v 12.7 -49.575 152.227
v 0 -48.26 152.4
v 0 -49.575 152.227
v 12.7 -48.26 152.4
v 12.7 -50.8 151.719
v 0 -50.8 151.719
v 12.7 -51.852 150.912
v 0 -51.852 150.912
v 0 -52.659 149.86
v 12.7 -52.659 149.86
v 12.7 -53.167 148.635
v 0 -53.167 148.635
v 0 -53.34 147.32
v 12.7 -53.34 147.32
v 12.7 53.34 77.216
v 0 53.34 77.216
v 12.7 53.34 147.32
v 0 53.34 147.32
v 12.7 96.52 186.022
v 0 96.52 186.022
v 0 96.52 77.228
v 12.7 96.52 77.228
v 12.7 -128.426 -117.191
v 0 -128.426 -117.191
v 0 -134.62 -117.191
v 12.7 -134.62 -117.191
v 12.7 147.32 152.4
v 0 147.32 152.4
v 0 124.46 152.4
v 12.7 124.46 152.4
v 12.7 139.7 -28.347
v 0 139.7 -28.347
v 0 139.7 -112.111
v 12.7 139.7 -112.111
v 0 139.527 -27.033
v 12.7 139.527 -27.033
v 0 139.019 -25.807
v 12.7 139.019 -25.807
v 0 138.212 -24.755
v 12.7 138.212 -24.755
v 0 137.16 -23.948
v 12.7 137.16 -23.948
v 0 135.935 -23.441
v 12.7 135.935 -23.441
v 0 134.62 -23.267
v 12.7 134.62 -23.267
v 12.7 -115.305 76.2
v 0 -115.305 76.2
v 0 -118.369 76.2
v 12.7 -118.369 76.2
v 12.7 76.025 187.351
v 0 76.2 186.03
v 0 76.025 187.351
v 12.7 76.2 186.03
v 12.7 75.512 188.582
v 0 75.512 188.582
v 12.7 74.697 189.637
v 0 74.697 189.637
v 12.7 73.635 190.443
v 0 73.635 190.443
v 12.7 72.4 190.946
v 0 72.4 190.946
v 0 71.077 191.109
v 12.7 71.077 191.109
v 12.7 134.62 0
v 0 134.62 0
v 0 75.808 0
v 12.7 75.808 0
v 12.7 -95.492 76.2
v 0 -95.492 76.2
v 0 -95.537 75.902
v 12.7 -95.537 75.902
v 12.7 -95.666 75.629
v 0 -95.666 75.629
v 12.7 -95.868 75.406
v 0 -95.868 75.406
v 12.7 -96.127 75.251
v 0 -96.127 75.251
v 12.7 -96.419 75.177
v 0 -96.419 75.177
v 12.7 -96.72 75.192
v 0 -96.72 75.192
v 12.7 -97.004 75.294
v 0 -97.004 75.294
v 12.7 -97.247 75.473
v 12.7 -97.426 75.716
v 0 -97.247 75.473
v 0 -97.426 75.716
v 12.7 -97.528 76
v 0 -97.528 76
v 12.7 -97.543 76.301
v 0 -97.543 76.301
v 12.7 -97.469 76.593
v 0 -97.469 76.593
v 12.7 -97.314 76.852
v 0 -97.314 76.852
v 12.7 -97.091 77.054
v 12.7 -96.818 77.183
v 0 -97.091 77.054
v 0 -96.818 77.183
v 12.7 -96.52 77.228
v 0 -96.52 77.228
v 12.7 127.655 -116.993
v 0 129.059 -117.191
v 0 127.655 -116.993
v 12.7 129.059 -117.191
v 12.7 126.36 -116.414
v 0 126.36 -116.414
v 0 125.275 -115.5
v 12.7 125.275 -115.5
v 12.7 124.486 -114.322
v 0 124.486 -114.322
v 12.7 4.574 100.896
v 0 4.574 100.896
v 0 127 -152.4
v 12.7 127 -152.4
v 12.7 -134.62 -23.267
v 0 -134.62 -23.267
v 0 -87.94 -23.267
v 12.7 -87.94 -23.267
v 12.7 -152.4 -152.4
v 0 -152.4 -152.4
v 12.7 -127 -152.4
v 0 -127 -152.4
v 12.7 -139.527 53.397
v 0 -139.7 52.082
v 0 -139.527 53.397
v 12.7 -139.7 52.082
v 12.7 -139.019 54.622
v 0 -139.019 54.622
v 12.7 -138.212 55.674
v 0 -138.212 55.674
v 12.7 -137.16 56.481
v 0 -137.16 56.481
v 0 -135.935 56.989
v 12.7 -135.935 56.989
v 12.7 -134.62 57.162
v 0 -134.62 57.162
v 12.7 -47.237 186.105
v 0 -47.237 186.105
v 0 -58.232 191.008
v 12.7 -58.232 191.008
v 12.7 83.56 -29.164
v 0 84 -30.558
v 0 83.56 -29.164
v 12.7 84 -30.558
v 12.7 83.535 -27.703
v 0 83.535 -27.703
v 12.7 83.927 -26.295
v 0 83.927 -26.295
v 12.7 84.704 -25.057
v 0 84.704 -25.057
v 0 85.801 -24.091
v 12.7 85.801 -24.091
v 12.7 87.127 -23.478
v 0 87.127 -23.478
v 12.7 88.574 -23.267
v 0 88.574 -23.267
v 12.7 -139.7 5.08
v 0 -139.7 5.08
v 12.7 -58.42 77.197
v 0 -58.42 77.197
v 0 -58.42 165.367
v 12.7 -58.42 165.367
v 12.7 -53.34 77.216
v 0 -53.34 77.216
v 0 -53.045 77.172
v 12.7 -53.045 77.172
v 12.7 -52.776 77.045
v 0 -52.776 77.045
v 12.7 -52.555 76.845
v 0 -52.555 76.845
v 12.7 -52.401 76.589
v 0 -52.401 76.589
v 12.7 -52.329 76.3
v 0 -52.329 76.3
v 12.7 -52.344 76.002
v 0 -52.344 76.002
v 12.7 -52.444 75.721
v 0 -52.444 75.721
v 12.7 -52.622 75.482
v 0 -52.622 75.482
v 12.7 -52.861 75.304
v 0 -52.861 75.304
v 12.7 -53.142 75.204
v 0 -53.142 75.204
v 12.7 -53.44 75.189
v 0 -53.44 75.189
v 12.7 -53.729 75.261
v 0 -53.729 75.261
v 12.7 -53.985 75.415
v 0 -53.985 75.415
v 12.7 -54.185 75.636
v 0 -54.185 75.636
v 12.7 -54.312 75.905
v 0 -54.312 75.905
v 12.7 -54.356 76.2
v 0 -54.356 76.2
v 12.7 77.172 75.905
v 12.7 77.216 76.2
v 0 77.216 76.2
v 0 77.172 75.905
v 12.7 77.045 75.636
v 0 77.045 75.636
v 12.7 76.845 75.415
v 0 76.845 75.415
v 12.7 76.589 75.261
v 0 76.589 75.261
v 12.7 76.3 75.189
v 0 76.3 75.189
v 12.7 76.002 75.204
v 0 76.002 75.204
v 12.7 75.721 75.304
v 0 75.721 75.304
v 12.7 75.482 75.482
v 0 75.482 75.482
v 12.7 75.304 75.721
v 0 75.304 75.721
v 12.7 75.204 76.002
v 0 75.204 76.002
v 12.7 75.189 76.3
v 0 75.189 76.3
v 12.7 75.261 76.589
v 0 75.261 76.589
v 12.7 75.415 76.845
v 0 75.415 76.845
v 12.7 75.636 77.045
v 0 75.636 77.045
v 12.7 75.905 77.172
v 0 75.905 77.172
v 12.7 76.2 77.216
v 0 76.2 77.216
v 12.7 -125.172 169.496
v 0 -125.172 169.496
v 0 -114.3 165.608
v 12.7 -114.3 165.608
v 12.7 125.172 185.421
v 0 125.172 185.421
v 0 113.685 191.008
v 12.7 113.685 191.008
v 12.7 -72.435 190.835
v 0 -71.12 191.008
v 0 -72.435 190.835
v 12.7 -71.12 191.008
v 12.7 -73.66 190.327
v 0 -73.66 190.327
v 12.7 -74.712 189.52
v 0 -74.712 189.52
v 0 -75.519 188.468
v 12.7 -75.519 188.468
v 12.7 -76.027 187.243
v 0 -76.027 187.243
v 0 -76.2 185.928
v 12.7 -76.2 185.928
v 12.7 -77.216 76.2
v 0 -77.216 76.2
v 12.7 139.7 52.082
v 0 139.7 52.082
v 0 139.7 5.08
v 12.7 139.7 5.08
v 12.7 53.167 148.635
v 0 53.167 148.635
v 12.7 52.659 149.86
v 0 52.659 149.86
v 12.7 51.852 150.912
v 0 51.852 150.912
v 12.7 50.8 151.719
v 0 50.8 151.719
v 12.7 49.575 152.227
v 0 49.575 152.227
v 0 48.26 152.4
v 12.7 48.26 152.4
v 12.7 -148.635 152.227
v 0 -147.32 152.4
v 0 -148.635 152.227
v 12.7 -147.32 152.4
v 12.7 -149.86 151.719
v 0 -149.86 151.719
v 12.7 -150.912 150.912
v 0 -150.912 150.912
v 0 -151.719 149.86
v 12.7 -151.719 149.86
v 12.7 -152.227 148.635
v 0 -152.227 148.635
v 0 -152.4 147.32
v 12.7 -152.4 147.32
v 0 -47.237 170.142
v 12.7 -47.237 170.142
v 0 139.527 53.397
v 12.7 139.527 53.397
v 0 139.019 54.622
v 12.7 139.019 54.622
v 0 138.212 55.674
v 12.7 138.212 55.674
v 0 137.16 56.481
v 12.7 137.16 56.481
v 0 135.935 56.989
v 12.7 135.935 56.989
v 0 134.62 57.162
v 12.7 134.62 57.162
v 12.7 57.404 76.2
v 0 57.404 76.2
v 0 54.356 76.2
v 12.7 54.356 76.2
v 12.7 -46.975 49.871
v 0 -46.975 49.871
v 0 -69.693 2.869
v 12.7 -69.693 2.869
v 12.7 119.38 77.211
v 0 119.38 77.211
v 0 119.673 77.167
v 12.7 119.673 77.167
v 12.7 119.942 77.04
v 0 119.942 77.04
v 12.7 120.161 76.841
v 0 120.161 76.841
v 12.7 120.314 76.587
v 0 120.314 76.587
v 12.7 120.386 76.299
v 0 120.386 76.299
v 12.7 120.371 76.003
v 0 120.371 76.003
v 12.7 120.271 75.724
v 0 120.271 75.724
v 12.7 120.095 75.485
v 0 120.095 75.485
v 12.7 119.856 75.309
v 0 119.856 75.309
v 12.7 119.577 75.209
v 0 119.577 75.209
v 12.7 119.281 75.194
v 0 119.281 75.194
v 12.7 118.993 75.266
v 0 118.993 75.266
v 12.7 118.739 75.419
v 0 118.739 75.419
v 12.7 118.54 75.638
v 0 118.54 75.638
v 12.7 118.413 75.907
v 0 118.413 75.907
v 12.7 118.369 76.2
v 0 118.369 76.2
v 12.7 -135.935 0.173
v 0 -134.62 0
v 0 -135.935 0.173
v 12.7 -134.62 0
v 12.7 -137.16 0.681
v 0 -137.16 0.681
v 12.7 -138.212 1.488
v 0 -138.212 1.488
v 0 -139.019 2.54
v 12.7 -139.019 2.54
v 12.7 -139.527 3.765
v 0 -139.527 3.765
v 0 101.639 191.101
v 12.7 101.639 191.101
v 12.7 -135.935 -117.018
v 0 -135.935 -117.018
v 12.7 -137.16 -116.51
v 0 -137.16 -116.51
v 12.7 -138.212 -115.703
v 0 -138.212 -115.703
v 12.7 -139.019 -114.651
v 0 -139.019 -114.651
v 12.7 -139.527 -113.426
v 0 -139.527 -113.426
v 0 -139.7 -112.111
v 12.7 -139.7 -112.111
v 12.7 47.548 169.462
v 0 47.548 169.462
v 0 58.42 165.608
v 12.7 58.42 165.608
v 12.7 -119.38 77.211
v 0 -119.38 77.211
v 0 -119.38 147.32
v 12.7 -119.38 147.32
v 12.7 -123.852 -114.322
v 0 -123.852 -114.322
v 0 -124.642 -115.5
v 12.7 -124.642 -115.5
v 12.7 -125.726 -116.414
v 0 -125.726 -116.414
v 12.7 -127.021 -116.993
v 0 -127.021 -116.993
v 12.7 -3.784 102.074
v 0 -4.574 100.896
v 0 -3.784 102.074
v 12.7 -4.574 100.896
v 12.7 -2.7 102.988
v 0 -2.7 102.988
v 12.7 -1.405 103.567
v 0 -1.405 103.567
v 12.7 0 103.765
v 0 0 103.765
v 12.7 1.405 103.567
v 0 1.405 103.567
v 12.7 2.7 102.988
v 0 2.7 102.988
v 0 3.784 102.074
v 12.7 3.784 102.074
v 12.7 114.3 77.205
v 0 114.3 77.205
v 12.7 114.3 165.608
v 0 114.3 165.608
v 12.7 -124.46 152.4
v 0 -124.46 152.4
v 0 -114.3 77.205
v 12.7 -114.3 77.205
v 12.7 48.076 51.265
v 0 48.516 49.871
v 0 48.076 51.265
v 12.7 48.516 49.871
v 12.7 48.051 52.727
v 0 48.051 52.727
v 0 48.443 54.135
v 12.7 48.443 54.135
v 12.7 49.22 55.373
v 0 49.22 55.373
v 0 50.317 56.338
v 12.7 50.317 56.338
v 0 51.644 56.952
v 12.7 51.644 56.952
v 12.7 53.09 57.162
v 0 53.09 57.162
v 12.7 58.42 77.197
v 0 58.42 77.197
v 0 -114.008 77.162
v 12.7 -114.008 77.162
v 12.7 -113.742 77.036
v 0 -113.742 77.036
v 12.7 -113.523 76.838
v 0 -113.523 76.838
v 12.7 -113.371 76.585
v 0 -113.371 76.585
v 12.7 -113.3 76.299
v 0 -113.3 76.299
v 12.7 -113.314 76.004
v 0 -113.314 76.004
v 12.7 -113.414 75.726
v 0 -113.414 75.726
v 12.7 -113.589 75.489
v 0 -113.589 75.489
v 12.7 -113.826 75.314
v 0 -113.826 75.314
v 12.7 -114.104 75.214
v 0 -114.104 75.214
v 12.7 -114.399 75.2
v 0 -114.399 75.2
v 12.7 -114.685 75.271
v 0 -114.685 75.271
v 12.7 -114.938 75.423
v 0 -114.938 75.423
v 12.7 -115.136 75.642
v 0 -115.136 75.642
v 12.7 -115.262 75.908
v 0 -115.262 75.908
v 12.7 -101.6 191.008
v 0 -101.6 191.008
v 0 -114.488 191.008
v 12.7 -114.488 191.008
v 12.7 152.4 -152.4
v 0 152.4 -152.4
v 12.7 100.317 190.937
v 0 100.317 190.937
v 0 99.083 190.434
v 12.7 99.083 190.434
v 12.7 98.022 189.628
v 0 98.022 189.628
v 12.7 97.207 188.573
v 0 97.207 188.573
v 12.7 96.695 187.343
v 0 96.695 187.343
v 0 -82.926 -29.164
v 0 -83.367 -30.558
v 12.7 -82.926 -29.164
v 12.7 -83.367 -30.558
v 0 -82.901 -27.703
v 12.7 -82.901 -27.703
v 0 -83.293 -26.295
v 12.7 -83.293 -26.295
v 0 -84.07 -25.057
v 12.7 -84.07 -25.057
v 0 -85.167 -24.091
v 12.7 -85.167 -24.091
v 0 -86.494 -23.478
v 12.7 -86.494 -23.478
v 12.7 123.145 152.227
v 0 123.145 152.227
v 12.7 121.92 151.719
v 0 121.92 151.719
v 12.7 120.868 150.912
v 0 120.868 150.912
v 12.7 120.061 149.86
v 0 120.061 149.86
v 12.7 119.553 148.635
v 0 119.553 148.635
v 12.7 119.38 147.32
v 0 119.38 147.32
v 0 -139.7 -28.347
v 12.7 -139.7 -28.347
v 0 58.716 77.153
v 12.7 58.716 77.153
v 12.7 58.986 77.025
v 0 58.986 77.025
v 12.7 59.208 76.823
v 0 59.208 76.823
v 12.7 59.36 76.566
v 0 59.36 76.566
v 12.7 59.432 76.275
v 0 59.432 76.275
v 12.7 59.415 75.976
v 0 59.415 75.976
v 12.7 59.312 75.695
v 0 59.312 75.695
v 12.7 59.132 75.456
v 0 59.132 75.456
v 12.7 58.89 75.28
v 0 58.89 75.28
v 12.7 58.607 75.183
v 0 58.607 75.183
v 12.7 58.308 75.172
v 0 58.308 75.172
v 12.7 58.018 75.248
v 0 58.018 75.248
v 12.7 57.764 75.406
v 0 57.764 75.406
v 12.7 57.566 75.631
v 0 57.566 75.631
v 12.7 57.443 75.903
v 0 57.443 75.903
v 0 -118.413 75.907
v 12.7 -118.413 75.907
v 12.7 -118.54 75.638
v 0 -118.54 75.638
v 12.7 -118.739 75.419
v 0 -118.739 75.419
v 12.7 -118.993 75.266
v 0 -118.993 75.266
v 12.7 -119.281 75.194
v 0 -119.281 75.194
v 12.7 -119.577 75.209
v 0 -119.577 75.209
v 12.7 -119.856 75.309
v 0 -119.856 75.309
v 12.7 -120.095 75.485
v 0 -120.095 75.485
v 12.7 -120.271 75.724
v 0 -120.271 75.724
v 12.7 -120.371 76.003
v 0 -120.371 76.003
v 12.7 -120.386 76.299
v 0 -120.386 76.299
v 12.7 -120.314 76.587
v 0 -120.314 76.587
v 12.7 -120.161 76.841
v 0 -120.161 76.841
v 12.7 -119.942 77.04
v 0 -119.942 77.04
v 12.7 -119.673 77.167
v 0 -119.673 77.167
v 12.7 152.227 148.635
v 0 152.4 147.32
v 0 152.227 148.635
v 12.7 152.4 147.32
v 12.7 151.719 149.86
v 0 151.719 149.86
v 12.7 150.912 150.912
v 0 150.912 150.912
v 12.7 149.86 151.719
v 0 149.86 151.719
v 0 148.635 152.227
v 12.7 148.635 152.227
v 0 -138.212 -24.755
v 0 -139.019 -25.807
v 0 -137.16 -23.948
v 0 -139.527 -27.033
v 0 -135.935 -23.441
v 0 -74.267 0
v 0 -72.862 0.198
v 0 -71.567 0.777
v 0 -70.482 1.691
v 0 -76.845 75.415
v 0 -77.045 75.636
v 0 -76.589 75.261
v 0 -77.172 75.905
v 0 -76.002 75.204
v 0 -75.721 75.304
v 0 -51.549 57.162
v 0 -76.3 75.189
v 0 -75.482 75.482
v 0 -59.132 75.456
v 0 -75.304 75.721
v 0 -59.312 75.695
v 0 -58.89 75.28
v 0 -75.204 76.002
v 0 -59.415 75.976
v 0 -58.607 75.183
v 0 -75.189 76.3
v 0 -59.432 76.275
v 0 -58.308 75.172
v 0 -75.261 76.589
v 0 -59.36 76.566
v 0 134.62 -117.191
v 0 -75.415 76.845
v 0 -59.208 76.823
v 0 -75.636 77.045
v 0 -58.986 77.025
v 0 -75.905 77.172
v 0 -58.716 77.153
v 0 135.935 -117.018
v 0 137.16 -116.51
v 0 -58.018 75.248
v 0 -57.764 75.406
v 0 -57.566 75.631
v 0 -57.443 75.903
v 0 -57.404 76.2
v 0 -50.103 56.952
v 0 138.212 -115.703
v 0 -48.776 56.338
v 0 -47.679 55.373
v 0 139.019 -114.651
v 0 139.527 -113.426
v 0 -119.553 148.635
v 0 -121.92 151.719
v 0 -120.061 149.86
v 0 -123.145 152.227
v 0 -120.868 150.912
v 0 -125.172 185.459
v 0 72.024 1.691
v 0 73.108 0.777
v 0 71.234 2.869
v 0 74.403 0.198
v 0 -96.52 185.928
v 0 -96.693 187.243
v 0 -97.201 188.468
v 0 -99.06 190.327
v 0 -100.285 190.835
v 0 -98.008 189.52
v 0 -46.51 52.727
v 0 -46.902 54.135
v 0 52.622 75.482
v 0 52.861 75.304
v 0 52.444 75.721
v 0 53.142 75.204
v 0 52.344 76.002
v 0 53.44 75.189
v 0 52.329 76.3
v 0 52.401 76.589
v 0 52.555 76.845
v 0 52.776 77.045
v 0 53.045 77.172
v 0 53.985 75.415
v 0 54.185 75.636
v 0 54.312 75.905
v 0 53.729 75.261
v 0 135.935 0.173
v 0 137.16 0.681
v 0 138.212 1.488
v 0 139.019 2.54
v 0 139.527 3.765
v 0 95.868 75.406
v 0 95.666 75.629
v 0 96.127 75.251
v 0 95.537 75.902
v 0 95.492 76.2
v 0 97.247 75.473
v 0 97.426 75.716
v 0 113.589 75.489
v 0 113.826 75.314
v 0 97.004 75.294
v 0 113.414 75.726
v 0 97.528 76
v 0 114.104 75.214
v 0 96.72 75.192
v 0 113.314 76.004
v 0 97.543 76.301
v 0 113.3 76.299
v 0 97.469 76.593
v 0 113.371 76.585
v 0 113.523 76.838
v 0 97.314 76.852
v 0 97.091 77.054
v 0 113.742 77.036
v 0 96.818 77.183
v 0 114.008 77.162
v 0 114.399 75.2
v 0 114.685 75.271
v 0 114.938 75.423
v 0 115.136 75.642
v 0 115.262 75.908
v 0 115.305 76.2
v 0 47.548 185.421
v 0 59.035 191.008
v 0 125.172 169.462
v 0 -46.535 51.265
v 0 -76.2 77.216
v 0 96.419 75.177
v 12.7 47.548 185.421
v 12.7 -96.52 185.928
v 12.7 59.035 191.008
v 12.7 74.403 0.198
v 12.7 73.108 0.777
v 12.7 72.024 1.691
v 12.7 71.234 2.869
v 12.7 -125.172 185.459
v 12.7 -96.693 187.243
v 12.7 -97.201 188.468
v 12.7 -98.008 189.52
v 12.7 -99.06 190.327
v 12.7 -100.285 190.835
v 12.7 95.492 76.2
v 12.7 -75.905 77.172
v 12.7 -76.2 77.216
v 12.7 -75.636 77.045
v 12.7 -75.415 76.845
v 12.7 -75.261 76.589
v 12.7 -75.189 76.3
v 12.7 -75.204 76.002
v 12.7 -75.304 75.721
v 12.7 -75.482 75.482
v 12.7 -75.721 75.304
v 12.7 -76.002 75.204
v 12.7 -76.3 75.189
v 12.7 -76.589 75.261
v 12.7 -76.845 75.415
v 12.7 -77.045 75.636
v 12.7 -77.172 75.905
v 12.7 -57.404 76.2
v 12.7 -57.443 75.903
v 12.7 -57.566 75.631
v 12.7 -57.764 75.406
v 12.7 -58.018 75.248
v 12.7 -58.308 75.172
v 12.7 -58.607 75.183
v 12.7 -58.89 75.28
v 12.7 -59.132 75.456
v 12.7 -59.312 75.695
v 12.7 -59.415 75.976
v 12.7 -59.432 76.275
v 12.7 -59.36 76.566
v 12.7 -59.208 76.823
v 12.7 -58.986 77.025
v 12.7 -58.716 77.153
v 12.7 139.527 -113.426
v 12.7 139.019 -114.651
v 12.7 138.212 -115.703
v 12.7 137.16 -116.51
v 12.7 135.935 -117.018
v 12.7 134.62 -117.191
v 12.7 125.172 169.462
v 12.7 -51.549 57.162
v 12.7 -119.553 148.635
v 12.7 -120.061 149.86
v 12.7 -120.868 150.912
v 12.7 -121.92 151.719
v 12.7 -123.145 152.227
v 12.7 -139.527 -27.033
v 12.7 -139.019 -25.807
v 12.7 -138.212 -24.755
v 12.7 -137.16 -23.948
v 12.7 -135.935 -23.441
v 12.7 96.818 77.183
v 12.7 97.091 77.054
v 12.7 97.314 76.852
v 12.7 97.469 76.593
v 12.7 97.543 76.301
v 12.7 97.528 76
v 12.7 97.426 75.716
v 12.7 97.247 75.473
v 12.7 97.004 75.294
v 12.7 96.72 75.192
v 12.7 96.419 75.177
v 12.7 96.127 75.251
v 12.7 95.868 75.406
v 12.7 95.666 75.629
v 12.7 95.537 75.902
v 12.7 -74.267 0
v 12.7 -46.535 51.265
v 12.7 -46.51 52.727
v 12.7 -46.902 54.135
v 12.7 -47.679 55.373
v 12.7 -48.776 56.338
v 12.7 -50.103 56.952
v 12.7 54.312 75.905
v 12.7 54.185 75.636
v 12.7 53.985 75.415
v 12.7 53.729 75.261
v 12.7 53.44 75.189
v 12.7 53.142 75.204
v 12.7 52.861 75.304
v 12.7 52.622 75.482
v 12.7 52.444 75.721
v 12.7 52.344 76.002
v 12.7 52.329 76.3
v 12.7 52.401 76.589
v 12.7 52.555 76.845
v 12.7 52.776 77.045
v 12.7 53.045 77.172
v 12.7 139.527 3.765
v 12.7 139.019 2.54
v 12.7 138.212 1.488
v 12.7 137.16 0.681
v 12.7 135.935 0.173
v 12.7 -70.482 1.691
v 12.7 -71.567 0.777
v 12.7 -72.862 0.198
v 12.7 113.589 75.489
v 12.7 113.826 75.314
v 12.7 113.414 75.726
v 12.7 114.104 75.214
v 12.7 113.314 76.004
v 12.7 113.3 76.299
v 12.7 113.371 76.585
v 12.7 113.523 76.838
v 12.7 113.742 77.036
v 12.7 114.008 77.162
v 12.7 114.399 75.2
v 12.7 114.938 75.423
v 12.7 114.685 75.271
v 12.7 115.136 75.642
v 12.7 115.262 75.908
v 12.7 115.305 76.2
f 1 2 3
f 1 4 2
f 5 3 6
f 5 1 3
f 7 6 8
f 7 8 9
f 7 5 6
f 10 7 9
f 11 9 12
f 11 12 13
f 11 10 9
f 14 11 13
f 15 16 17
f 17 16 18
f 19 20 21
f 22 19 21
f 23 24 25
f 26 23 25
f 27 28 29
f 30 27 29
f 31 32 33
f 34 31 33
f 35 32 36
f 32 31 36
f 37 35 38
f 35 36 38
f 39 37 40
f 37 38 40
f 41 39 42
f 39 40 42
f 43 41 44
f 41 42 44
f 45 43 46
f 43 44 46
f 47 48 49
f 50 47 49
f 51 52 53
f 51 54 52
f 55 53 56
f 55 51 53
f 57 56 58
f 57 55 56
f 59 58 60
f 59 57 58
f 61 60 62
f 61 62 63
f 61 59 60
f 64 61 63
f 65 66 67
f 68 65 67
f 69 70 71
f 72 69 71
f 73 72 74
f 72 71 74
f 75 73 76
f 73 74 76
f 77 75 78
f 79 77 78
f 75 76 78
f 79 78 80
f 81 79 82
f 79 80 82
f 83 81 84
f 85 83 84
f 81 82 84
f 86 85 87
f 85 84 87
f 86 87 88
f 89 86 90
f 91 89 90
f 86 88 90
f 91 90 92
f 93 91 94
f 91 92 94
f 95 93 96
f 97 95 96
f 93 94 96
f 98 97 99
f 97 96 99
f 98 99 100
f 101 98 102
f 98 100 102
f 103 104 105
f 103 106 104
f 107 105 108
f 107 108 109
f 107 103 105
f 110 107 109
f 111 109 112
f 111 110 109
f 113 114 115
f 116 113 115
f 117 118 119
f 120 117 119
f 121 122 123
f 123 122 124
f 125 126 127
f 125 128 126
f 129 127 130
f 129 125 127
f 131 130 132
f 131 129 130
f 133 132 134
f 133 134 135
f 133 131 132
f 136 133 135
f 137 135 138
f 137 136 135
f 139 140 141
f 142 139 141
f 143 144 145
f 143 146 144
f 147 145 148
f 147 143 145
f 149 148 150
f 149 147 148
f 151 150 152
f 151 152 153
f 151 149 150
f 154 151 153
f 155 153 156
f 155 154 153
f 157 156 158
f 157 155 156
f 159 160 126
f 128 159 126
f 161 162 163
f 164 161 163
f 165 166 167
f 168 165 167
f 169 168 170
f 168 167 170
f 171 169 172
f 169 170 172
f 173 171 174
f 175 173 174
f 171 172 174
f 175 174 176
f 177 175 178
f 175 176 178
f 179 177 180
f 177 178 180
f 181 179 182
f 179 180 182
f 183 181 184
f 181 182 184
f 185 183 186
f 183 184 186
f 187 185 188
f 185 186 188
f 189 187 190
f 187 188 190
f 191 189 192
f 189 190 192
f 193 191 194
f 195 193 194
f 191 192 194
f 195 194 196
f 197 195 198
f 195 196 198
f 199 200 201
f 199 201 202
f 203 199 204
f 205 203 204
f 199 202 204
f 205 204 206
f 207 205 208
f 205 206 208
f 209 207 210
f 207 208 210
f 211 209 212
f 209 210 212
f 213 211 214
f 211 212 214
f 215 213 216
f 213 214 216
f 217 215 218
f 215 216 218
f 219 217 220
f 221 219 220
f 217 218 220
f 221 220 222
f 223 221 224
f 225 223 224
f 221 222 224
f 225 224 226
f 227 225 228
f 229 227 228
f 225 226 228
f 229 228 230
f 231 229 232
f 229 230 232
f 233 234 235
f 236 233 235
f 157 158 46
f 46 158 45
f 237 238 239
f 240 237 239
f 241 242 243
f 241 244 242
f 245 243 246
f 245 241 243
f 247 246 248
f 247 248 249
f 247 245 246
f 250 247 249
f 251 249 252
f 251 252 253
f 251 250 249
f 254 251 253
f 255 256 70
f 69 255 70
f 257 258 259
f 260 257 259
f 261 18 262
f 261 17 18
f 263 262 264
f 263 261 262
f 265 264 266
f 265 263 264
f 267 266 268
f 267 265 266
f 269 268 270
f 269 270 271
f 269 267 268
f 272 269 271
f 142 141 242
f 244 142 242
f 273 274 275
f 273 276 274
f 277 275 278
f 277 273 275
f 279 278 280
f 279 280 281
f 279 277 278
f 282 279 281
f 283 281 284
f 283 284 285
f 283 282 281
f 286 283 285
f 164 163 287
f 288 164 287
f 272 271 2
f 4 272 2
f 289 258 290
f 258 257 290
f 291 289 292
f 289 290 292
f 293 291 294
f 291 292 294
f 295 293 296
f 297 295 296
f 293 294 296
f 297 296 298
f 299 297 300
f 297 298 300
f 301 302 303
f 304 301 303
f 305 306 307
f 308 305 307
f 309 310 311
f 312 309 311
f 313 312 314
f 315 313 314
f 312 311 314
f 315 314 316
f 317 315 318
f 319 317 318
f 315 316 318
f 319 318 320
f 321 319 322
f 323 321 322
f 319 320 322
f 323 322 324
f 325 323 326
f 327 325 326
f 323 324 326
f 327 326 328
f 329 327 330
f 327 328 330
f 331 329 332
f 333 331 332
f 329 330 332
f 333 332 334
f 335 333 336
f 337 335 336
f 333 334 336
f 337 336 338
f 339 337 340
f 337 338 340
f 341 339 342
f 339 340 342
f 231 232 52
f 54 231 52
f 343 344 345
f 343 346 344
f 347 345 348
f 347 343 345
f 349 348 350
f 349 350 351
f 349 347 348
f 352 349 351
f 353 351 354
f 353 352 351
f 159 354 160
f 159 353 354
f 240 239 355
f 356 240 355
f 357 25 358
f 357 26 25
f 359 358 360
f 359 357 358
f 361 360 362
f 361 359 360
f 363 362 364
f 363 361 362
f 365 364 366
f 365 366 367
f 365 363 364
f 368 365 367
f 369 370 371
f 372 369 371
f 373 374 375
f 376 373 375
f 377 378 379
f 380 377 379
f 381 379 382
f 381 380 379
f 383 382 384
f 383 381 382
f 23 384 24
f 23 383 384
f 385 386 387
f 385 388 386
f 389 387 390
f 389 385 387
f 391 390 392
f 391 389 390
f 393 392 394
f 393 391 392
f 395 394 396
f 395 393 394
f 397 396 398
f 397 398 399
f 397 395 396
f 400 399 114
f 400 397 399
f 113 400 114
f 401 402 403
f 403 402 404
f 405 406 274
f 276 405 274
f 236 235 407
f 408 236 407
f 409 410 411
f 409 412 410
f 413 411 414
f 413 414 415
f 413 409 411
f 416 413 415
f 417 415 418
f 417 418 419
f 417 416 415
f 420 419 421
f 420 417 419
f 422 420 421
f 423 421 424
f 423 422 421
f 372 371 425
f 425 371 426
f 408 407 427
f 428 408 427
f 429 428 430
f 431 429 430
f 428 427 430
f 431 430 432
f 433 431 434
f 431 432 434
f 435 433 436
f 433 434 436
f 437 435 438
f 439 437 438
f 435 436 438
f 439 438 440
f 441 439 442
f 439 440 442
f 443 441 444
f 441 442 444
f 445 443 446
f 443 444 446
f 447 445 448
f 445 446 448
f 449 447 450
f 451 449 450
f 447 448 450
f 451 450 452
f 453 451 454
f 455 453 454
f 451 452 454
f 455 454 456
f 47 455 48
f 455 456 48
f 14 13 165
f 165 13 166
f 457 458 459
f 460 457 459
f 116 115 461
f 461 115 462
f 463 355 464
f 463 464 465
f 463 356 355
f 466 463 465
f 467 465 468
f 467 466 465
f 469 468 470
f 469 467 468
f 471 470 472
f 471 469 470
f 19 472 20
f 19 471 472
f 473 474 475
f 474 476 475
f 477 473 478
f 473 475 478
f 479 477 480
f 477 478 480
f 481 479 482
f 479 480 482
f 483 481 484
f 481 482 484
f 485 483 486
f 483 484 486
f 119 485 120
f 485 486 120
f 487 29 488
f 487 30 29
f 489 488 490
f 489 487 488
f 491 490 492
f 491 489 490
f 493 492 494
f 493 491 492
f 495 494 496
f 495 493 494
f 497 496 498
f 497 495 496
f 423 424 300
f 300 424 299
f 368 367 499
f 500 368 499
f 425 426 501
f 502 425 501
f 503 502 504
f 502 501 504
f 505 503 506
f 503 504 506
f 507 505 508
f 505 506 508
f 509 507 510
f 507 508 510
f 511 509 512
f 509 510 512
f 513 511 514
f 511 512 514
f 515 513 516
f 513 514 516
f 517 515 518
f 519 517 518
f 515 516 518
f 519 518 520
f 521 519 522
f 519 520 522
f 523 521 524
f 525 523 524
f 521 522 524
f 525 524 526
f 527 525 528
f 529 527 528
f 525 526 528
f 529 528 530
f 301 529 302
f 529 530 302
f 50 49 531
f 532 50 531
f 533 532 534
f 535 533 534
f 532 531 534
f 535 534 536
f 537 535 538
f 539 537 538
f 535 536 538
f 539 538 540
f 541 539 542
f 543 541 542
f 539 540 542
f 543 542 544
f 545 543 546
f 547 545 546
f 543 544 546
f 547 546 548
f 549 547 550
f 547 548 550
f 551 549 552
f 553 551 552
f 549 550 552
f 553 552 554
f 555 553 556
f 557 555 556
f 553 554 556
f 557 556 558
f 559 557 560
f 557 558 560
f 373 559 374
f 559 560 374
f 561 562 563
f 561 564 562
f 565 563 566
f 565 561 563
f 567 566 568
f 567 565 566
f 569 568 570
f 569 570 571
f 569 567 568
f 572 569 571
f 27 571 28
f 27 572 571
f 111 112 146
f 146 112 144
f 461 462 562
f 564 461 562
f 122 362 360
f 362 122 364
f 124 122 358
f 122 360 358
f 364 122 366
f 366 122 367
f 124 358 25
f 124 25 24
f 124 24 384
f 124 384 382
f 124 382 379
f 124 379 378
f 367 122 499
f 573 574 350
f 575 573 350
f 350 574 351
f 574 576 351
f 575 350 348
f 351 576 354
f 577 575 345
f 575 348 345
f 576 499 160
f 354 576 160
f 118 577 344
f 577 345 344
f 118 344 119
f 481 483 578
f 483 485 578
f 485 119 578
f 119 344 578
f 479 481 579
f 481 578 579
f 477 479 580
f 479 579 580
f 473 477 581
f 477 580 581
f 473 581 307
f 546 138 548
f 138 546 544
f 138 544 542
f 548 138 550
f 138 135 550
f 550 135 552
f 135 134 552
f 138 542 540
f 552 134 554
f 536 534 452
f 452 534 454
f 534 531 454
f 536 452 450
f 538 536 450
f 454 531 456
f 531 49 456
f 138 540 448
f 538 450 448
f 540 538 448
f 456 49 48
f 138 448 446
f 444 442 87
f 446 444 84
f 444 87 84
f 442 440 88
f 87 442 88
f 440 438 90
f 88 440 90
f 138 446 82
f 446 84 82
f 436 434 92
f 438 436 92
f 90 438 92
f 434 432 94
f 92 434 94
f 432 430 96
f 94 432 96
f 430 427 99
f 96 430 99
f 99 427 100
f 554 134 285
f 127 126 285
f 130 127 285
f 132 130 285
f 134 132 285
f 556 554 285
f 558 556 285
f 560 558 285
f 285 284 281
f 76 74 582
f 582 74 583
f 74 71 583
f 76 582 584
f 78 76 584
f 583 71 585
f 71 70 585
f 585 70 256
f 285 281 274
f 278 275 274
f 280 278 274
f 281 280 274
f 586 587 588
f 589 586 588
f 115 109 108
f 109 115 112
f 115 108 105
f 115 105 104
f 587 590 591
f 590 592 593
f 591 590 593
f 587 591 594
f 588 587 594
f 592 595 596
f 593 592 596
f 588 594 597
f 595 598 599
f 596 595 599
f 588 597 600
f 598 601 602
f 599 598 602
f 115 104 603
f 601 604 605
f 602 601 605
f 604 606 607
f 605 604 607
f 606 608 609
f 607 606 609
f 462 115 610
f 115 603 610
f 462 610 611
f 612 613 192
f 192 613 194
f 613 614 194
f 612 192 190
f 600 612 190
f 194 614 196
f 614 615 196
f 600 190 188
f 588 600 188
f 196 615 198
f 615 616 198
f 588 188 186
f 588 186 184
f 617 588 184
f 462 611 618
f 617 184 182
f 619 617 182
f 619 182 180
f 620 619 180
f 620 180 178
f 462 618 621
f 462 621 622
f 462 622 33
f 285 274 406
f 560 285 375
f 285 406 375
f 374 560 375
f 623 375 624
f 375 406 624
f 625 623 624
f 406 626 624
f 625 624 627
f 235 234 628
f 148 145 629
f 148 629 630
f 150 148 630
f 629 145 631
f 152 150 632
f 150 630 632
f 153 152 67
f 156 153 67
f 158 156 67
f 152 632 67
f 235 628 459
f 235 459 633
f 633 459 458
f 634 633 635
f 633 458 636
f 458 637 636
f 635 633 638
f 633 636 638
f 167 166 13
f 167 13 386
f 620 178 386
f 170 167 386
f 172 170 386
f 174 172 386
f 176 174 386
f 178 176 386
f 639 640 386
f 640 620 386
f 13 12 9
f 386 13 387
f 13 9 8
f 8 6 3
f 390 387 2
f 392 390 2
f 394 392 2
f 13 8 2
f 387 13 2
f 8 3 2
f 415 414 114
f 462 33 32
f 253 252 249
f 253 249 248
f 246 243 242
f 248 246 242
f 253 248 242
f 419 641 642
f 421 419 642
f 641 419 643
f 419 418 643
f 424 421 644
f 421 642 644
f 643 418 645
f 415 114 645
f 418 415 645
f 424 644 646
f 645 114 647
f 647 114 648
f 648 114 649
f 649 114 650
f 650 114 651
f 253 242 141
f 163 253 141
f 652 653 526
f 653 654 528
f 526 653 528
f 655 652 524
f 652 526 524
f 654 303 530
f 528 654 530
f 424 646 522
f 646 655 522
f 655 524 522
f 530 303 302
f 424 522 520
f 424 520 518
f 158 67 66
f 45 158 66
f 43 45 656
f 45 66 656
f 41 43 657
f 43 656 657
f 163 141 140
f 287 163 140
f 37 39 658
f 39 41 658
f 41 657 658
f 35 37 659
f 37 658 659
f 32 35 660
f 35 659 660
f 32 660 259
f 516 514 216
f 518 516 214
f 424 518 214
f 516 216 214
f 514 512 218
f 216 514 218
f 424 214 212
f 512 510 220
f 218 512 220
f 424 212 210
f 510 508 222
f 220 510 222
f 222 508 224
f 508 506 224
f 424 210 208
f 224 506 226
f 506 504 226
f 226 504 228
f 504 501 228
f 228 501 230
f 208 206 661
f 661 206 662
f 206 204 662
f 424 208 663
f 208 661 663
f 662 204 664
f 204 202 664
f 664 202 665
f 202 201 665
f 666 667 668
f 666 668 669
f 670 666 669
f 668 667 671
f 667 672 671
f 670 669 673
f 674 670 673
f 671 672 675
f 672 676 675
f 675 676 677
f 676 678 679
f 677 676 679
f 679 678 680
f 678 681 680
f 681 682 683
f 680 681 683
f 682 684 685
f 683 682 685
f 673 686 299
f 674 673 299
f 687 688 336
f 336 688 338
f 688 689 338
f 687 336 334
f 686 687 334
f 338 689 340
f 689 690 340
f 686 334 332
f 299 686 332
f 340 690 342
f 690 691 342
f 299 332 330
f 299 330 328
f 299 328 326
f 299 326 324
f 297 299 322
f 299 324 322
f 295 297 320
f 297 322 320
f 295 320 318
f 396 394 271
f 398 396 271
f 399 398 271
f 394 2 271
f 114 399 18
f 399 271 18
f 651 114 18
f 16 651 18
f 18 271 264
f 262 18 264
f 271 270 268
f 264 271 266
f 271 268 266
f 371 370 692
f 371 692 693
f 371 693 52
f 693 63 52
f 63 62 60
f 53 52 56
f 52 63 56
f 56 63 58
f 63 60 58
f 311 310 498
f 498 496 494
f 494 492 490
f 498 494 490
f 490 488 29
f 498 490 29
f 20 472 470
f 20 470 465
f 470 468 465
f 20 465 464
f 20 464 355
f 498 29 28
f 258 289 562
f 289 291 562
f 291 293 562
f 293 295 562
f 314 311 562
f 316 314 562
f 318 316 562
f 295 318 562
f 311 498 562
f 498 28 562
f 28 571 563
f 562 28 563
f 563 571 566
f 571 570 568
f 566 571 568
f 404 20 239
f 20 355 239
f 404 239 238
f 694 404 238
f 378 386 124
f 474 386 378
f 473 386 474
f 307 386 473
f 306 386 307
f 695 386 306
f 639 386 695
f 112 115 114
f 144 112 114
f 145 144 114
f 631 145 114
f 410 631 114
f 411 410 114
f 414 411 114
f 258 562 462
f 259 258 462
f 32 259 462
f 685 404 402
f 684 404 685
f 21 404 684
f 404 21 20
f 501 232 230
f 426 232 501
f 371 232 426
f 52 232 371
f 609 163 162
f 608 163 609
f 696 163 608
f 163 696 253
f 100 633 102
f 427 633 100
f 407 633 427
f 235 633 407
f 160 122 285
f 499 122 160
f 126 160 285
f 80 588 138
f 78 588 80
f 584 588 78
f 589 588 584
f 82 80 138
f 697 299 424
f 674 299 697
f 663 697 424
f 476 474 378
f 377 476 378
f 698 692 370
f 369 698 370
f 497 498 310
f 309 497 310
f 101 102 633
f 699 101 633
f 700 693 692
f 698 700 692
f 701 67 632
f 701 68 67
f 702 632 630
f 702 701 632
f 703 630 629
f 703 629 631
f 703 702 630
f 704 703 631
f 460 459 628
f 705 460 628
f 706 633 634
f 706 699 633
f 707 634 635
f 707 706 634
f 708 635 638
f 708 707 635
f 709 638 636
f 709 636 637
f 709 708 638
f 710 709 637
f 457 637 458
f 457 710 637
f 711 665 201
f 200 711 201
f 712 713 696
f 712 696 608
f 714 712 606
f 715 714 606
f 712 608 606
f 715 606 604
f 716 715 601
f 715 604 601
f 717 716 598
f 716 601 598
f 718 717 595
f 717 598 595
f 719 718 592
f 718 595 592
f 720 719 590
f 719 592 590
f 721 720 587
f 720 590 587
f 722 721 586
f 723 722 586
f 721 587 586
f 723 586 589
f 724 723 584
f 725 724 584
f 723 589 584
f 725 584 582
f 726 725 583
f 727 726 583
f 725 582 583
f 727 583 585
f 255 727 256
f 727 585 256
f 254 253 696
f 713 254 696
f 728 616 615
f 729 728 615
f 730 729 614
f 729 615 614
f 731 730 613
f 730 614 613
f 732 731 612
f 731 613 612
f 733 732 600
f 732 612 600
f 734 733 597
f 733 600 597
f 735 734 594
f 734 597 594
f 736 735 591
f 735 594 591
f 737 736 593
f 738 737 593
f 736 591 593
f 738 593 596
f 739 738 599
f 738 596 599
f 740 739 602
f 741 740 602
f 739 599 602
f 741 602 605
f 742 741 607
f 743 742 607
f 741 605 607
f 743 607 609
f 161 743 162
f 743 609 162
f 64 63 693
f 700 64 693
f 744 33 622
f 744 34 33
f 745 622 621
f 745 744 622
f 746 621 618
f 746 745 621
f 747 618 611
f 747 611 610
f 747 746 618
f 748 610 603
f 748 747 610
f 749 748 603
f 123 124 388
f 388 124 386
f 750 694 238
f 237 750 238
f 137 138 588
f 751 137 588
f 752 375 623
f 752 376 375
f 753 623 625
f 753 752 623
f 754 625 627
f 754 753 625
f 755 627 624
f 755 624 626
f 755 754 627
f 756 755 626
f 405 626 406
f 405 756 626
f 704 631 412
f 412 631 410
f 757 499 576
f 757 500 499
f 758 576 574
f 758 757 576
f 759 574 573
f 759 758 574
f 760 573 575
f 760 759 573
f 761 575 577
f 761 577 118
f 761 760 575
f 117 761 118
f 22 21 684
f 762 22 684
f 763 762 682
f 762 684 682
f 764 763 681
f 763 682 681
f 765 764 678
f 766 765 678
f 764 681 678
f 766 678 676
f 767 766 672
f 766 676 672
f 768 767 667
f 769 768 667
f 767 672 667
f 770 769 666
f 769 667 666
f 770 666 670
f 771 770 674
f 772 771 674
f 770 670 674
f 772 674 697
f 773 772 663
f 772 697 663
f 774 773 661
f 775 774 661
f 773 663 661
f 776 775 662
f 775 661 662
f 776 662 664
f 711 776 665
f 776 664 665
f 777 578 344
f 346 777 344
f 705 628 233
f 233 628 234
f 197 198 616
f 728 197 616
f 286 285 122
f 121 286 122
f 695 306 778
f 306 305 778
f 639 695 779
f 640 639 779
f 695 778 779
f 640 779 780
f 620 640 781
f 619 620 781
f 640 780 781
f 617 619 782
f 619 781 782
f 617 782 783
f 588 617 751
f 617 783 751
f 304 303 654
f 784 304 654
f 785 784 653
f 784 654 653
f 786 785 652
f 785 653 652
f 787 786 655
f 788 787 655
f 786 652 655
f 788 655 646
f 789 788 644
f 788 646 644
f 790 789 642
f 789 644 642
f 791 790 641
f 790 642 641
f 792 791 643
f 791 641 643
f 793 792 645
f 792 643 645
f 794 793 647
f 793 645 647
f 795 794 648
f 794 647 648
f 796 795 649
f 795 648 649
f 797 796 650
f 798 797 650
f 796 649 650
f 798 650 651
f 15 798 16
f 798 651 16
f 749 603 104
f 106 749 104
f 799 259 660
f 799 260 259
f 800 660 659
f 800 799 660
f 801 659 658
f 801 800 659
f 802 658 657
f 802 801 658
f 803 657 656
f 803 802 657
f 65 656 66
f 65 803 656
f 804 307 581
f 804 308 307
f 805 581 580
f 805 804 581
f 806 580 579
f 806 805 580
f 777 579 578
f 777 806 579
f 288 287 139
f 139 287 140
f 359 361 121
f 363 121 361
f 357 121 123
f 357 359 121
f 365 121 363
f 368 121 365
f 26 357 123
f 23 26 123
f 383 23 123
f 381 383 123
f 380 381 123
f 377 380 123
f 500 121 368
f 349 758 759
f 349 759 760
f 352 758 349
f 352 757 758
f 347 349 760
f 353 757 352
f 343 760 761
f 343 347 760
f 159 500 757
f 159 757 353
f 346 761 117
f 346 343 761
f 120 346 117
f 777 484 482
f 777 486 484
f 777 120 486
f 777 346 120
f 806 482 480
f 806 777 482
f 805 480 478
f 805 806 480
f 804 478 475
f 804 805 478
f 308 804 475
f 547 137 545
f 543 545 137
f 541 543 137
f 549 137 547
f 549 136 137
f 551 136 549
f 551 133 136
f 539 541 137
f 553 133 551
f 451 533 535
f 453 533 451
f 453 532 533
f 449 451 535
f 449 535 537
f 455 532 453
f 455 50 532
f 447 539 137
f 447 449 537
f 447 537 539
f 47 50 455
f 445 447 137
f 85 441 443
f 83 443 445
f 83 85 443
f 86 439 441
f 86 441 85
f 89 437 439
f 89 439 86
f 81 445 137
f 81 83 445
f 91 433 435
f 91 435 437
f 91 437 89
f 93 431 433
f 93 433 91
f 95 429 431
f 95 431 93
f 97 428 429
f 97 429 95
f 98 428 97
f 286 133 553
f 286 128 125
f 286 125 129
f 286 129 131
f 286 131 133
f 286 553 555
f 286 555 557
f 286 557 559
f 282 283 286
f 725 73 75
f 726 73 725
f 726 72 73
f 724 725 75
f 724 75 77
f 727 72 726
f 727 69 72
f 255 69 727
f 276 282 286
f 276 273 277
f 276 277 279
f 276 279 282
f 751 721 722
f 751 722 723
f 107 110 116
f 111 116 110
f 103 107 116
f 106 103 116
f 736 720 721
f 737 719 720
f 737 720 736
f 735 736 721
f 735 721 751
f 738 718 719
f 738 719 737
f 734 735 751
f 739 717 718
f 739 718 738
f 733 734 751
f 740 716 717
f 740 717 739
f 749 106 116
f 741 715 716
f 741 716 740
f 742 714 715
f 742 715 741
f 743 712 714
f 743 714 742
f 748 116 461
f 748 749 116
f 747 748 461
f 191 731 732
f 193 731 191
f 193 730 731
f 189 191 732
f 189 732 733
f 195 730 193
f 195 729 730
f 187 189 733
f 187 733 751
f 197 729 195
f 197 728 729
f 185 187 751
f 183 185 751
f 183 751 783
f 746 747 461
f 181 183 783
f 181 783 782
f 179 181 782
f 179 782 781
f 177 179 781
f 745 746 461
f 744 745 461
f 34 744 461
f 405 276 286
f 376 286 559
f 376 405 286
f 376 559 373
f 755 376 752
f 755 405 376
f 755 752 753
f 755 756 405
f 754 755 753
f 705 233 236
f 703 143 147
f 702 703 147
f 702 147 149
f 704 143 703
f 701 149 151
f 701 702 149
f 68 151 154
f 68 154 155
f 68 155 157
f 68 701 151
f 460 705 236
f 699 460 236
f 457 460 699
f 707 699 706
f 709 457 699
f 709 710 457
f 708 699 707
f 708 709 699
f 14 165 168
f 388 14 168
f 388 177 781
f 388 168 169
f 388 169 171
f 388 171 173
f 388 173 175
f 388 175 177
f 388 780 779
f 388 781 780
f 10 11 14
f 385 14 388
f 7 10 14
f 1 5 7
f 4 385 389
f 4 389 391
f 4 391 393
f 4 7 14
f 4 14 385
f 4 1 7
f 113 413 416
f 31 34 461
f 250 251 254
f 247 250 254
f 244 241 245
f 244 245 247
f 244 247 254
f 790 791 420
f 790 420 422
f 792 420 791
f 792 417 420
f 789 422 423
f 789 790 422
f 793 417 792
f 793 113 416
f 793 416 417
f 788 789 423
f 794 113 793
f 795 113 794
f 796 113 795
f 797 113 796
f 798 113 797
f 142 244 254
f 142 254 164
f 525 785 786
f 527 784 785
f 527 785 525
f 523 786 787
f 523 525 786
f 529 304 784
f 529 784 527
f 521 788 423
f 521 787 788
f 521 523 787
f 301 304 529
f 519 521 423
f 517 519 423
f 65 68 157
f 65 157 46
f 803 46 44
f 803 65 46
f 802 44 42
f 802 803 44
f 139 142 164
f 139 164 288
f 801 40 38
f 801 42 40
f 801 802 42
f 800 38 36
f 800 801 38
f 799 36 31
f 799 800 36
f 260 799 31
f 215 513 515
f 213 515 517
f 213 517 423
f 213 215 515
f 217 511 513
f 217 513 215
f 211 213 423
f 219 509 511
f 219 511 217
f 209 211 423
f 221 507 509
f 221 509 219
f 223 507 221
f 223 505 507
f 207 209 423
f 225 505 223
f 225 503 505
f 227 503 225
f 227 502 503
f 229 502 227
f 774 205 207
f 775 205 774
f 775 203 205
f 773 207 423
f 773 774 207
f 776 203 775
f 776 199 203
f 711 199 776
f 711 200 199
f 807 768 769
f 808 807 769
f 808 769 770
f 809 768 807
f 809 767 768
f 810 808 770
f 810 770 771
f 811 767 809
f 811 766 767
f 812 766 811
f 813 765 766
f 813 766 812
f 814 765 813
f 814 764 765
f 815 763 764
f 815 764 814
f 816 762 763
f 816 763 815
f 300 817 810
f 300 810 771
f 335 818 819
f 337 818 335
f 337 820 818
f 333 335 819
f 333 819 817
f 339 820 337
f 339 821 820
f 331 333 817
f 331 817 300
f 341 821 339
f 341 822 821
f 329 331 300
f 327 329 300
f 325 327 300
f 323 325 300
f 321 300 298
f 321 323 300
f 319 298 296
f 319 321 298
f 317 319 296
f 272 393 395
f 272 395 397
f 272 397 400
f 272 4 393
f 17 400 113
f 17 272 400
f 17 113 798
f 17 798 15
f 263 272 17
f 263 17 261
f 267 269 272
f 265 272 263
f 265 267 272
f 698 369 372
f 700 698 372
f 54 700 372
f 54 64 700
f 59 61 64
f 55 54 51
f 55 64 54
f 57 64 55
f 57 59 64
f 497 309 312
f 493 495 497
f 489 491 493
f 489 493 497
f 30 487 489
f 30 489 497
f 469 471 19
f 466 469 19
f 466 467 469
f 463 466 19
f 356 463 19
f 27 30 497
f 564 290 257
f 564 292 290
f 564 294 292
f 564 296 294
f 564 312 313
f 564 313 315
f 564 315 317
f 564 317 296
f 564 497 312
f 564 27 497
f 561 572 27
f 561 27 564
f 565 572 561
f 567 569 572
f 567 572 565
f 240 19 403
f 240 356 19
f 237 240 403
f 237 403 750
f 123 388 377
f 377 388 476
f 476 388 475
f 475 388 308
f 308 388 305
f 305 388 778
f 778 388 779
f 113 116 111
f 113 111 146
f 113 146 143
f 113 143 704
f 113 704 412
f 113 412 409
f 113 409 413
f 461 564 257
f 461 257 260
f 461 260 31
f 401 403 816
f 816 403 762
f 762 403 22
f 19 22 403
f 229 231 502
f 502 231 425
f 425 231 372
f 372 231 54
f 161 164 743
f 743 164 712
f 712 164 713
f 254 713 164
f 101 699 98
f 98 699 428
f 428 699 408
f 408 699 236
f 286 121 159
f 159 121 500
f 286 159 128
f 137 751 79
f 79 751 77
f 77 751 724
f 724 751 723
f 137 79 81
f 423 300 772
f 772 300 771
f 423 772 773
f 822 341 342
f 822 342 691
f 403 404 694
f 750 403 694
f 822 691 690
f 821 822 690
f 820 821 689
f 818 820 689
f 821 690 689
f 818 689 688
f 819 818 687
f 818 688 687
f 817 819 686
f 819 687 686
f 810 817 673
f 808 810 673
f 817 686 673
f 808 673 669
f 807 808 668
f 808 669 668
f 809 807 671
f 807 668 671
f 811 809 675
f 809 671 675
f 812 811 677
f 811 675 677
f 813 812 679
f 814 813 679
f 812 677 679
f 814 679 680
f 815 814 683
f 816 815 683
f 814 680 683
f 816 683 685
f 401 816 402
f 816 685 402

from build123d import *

# Parameters (mm, degrees)
F1_DEPTH = 12.7
F2_R     = 5.08
F3_R     = 5.08
F4_R     = 5.08
F5_R     = 5.08


with BuildPart() as f1:
    # F0 (on Right) → F1 (new body)
    with BuildSketch(Plane.YZ):
        with BuildLine():
            Line((-152.4, -152.4), (-127, -152.4))
            Line((-127, -152.4), (0, 110.3586206897))
            Line((0, 110.3586206897), (-20.32, 152.4))
            Line((-20.32, 152.4), (-53.34, 152.4))
            Line((-53.34, 152.4), (-53.34, 77.216))
            ThreePointArc((-53.34, 77.216), (-52.6215795103, 75.4815795103), (-54.356, 76.2))
            Line((-54.356, 76.2), (-57.4041717125, 76.2))
            ThreePointArc((-57.4041717125, 76.2), (-59.1317859709, 75.4563270968), (-58.42, 77.1973213944))
            Line((-58.42, 77.1973213944), (-58.42, 152.4))
            Line((-58.42, 152.4), (-76.2, 152.4))
            Line((-76.2, 152.4), (-76.2, 77.216))
            ThreePointArc((-76.2, 77.216), (-75.4815795103, 75.4815795103), (-77.216, 76.2))
            Line((-77.216, 76.2), (-95.4923106742, 76.2))
            ThreePointArc((-95.4923106742, 76.2), (-97.2466860912, 75.4733139088), (-96.52, 77.2276893258))
            Line((-96.52, 77.2276893258), (-96.52, 152.4))
            Line((-96.52, 152.4), (-114.3, 152.4))
            Line((-114.3, 152.4), (-114.3, 77.2051736712))
            ThreePointArc((-114.3, 77.2051736712), (-113.5892348808, 75.4892348808), (-115.3051736712, 76.2))
            Line((-115.3051736712, 76.2), (-118.3691862392, 76.2))
            ThreePointArc((-118.3691862392, 76.2), (-120.0947532647, 75.4852467353), (-119.38, 77.2108137608))
            Line((-119.38, 77.2108137608), (-119.38, 152.4))
            Line((-119.38, 152.4), (-152.4, 152.4))
            Line((-152.4, 152.4), (-152.4, -152.4))
        make_face()
        Polygon((-125.2390742302, -117.1909989266), (-139.7, -117.1909989266), (-139.7, -23.267487064), (-79.8427101633, -23.267487064), align=None, mode=Mode.SUBTRACT)
        Polygon((-71.0798129439, 0), (-139.7, 0), (-139.7, 57.1620902733), (-43.4514693118, 57.1620902733), align=None, mode=Mode.SUBTRACT)
        Polygon((-20.32, 152.4), (0, 110.3586206897), (20.32, 152.4), align=None)
        Polygon((-114.3, 165.608), (-114.3, 152.4), (-96.52, 152.4), (-96.52, 191.008), (-114.4882887602, 191.008), (-125.171661377, 185.4585111141), (-125.171661377, 169.4956421852), align=None)
        Polygon((-76.2, 152.4), (-58.42, 152.4), (-58.42, 165.3668519163), (-47.2367718493, 170.141807182), (-47.2367718493, 186.1046761109), (-58.2317112398, 191.008), (-76.2, 191.008), align=None)
        with BuildLine():
            Line((152.4, -152.4), (152.4, 152.4))
            Line((152.4, 152.4), (119.38, 152.4))
            Line((119.38, 152.4), (119.38, 77.2108137608))
            ThreePointArc((119.38, 77.2108137608), (120.0947532647, 75.4852467353), (118.3691862392, 76.2))
            Line((118.3691862392, 76.2), (115.3051736712, 76.2))
            ThreePointArc((115.3051736712, 76.2), (113.5892348808, 75.4892348808), (114.3, 77.2051736712))
            Line((114.3, 77.2051736712), (114.3, 152.4))
            Line((114.3, 152.4), (96.52, 152.4))
            Line((96.52, 152.4), (96.52, 77.2276893258))
            ThreePointArc((96.52, 77.2276893258), (97.2466860912, 75.4733139088), (95.4923106742, 76.2))
            Line((95.4923106742, 76.2), (77.216, 76.2))
            ThreePointArc((77.216, 76.2), (75.4815795103, 75.4815795103), (76.2, 77.216))
            Line((76.2, 77.216), (76.2, 152.4))
            Line((76.2, 152.4), (58.42, 152.4))
            Line((58.42, 152.4), (58.42, 77.1973213944))
            ThreePointArc((58.42, 77.1973213944), (59.1317859709, 75.4563270968), (57.4041717125, 76.2))
            Line((57.4041717125, 76.2), (54.356, 76.2))
            ThreePointArc((54.356, 76.2), (52.6215795103, 75.4815795103), (53.34, 77.216))
            Line((53.34, 77.216), (53.34, 152.4))
            Line((53.34, 152.4), (20.32, 152.4))
            Line((20.32, 152.4), (0, 110.3586206897))
            Line((0, 110.3586206897), (127, -152.4))
            Line((127, -152.4), (152.4, -152.4))
        make_face()
        Polygon((139.7, -117.1909989266), (125.8725191181, -117.1909989266), (80.4761550512, -23.267487064), (139.7, -23.267487064), align=None, mode=Mode.SUBTRACT)
        Polygon((139.7, 0), (72.6210160618, 0), (44.9926724297, 57.1620902733), (139.7, 57.1620902733), align=None, mode=Mode.SUBTRACT)
        Polygon((58.42, 152.4), (76.2, 152.4), (76.2, 166.0996880174), (76.2, 191.1524534295), (59.0350851188, 191.008), (47.548338623, 185.4211749058), (47.548338623, 169.4616637616), (58.42, 165.608), align=None)
        Polygon((96.52, 152.4), (114.3, 152.4), (114.3, 165.608), (125.1717001088, 169.4615544924), (125.1717001088, 185.4210656367), (113.6850067591, 191.008), (96.52, 191.141088813), (96.52, 166.109945806), align=None)
    extrude(amount=F1_DEPTH)

    # F2
    f2_edges = [f1.edges().sort_by_distance(p)[0] for p in [
        (6.35, -139.7, 57.16209),
        (6.35, -43.451469, 57.16209),
        (6.35, -71.079813, 0),
        (6.35, -139.7, 0),
    ]]
    fillet(f2_edges, radius=F2_R)

    # F3
    f3_edges = [f1.edges().sort_by_distance(p)[0] for p in [
        (6.35, -139.7, -23.267487),
        (6.35, -79.84271, -23.267487),
        (6.35, -125.239074, -117.190999),
        (6.35, -139.7, -117.190999),
    ]]
    fillet(f3_edges, radius=F3_R)

    # F4
    f4_edges = [f1.edges().sort_by_distance(p)[0] for p in [
        (6.35, 139.7, 57.16209),
        (6.35, 44.992672, 57.16209),
        (6.35, 72.621016, 0),
        (6.35, 139.7, 0),
        (6.35, 139.7, -23.267487),
        (6.35, 80.476155, -23.267487),
        (6.35, 125.872519, -117.190999),
        (6.35, 139.7, -117.190999),
    ]]
    fillet(f4_edges, radius=F4_R)

    # F5
    f5_edges = [f1.edges().sort_by_distance(p)[0] for p in [
        (6.35, -119.38, 152.4),
        (6.35, -152.4, 152.4),
        (6.35, -53.34, 152.4),
        (6.35, 53.34, 152.4),
        (6.35, 119.38, 152.4),
        (6.35, 152.4, 152.4),
        (6.35, 0, 110.358621),
        (6.35, -96.52, 191.008),
        (6.35, -76.2, 191.008),
        (6.35, 96.52, 191.141089),
        (6.35, 76.2, 191.152453),
    ]]
    fillet(f5_edges, radius=F5_R)


solid = f1.part
